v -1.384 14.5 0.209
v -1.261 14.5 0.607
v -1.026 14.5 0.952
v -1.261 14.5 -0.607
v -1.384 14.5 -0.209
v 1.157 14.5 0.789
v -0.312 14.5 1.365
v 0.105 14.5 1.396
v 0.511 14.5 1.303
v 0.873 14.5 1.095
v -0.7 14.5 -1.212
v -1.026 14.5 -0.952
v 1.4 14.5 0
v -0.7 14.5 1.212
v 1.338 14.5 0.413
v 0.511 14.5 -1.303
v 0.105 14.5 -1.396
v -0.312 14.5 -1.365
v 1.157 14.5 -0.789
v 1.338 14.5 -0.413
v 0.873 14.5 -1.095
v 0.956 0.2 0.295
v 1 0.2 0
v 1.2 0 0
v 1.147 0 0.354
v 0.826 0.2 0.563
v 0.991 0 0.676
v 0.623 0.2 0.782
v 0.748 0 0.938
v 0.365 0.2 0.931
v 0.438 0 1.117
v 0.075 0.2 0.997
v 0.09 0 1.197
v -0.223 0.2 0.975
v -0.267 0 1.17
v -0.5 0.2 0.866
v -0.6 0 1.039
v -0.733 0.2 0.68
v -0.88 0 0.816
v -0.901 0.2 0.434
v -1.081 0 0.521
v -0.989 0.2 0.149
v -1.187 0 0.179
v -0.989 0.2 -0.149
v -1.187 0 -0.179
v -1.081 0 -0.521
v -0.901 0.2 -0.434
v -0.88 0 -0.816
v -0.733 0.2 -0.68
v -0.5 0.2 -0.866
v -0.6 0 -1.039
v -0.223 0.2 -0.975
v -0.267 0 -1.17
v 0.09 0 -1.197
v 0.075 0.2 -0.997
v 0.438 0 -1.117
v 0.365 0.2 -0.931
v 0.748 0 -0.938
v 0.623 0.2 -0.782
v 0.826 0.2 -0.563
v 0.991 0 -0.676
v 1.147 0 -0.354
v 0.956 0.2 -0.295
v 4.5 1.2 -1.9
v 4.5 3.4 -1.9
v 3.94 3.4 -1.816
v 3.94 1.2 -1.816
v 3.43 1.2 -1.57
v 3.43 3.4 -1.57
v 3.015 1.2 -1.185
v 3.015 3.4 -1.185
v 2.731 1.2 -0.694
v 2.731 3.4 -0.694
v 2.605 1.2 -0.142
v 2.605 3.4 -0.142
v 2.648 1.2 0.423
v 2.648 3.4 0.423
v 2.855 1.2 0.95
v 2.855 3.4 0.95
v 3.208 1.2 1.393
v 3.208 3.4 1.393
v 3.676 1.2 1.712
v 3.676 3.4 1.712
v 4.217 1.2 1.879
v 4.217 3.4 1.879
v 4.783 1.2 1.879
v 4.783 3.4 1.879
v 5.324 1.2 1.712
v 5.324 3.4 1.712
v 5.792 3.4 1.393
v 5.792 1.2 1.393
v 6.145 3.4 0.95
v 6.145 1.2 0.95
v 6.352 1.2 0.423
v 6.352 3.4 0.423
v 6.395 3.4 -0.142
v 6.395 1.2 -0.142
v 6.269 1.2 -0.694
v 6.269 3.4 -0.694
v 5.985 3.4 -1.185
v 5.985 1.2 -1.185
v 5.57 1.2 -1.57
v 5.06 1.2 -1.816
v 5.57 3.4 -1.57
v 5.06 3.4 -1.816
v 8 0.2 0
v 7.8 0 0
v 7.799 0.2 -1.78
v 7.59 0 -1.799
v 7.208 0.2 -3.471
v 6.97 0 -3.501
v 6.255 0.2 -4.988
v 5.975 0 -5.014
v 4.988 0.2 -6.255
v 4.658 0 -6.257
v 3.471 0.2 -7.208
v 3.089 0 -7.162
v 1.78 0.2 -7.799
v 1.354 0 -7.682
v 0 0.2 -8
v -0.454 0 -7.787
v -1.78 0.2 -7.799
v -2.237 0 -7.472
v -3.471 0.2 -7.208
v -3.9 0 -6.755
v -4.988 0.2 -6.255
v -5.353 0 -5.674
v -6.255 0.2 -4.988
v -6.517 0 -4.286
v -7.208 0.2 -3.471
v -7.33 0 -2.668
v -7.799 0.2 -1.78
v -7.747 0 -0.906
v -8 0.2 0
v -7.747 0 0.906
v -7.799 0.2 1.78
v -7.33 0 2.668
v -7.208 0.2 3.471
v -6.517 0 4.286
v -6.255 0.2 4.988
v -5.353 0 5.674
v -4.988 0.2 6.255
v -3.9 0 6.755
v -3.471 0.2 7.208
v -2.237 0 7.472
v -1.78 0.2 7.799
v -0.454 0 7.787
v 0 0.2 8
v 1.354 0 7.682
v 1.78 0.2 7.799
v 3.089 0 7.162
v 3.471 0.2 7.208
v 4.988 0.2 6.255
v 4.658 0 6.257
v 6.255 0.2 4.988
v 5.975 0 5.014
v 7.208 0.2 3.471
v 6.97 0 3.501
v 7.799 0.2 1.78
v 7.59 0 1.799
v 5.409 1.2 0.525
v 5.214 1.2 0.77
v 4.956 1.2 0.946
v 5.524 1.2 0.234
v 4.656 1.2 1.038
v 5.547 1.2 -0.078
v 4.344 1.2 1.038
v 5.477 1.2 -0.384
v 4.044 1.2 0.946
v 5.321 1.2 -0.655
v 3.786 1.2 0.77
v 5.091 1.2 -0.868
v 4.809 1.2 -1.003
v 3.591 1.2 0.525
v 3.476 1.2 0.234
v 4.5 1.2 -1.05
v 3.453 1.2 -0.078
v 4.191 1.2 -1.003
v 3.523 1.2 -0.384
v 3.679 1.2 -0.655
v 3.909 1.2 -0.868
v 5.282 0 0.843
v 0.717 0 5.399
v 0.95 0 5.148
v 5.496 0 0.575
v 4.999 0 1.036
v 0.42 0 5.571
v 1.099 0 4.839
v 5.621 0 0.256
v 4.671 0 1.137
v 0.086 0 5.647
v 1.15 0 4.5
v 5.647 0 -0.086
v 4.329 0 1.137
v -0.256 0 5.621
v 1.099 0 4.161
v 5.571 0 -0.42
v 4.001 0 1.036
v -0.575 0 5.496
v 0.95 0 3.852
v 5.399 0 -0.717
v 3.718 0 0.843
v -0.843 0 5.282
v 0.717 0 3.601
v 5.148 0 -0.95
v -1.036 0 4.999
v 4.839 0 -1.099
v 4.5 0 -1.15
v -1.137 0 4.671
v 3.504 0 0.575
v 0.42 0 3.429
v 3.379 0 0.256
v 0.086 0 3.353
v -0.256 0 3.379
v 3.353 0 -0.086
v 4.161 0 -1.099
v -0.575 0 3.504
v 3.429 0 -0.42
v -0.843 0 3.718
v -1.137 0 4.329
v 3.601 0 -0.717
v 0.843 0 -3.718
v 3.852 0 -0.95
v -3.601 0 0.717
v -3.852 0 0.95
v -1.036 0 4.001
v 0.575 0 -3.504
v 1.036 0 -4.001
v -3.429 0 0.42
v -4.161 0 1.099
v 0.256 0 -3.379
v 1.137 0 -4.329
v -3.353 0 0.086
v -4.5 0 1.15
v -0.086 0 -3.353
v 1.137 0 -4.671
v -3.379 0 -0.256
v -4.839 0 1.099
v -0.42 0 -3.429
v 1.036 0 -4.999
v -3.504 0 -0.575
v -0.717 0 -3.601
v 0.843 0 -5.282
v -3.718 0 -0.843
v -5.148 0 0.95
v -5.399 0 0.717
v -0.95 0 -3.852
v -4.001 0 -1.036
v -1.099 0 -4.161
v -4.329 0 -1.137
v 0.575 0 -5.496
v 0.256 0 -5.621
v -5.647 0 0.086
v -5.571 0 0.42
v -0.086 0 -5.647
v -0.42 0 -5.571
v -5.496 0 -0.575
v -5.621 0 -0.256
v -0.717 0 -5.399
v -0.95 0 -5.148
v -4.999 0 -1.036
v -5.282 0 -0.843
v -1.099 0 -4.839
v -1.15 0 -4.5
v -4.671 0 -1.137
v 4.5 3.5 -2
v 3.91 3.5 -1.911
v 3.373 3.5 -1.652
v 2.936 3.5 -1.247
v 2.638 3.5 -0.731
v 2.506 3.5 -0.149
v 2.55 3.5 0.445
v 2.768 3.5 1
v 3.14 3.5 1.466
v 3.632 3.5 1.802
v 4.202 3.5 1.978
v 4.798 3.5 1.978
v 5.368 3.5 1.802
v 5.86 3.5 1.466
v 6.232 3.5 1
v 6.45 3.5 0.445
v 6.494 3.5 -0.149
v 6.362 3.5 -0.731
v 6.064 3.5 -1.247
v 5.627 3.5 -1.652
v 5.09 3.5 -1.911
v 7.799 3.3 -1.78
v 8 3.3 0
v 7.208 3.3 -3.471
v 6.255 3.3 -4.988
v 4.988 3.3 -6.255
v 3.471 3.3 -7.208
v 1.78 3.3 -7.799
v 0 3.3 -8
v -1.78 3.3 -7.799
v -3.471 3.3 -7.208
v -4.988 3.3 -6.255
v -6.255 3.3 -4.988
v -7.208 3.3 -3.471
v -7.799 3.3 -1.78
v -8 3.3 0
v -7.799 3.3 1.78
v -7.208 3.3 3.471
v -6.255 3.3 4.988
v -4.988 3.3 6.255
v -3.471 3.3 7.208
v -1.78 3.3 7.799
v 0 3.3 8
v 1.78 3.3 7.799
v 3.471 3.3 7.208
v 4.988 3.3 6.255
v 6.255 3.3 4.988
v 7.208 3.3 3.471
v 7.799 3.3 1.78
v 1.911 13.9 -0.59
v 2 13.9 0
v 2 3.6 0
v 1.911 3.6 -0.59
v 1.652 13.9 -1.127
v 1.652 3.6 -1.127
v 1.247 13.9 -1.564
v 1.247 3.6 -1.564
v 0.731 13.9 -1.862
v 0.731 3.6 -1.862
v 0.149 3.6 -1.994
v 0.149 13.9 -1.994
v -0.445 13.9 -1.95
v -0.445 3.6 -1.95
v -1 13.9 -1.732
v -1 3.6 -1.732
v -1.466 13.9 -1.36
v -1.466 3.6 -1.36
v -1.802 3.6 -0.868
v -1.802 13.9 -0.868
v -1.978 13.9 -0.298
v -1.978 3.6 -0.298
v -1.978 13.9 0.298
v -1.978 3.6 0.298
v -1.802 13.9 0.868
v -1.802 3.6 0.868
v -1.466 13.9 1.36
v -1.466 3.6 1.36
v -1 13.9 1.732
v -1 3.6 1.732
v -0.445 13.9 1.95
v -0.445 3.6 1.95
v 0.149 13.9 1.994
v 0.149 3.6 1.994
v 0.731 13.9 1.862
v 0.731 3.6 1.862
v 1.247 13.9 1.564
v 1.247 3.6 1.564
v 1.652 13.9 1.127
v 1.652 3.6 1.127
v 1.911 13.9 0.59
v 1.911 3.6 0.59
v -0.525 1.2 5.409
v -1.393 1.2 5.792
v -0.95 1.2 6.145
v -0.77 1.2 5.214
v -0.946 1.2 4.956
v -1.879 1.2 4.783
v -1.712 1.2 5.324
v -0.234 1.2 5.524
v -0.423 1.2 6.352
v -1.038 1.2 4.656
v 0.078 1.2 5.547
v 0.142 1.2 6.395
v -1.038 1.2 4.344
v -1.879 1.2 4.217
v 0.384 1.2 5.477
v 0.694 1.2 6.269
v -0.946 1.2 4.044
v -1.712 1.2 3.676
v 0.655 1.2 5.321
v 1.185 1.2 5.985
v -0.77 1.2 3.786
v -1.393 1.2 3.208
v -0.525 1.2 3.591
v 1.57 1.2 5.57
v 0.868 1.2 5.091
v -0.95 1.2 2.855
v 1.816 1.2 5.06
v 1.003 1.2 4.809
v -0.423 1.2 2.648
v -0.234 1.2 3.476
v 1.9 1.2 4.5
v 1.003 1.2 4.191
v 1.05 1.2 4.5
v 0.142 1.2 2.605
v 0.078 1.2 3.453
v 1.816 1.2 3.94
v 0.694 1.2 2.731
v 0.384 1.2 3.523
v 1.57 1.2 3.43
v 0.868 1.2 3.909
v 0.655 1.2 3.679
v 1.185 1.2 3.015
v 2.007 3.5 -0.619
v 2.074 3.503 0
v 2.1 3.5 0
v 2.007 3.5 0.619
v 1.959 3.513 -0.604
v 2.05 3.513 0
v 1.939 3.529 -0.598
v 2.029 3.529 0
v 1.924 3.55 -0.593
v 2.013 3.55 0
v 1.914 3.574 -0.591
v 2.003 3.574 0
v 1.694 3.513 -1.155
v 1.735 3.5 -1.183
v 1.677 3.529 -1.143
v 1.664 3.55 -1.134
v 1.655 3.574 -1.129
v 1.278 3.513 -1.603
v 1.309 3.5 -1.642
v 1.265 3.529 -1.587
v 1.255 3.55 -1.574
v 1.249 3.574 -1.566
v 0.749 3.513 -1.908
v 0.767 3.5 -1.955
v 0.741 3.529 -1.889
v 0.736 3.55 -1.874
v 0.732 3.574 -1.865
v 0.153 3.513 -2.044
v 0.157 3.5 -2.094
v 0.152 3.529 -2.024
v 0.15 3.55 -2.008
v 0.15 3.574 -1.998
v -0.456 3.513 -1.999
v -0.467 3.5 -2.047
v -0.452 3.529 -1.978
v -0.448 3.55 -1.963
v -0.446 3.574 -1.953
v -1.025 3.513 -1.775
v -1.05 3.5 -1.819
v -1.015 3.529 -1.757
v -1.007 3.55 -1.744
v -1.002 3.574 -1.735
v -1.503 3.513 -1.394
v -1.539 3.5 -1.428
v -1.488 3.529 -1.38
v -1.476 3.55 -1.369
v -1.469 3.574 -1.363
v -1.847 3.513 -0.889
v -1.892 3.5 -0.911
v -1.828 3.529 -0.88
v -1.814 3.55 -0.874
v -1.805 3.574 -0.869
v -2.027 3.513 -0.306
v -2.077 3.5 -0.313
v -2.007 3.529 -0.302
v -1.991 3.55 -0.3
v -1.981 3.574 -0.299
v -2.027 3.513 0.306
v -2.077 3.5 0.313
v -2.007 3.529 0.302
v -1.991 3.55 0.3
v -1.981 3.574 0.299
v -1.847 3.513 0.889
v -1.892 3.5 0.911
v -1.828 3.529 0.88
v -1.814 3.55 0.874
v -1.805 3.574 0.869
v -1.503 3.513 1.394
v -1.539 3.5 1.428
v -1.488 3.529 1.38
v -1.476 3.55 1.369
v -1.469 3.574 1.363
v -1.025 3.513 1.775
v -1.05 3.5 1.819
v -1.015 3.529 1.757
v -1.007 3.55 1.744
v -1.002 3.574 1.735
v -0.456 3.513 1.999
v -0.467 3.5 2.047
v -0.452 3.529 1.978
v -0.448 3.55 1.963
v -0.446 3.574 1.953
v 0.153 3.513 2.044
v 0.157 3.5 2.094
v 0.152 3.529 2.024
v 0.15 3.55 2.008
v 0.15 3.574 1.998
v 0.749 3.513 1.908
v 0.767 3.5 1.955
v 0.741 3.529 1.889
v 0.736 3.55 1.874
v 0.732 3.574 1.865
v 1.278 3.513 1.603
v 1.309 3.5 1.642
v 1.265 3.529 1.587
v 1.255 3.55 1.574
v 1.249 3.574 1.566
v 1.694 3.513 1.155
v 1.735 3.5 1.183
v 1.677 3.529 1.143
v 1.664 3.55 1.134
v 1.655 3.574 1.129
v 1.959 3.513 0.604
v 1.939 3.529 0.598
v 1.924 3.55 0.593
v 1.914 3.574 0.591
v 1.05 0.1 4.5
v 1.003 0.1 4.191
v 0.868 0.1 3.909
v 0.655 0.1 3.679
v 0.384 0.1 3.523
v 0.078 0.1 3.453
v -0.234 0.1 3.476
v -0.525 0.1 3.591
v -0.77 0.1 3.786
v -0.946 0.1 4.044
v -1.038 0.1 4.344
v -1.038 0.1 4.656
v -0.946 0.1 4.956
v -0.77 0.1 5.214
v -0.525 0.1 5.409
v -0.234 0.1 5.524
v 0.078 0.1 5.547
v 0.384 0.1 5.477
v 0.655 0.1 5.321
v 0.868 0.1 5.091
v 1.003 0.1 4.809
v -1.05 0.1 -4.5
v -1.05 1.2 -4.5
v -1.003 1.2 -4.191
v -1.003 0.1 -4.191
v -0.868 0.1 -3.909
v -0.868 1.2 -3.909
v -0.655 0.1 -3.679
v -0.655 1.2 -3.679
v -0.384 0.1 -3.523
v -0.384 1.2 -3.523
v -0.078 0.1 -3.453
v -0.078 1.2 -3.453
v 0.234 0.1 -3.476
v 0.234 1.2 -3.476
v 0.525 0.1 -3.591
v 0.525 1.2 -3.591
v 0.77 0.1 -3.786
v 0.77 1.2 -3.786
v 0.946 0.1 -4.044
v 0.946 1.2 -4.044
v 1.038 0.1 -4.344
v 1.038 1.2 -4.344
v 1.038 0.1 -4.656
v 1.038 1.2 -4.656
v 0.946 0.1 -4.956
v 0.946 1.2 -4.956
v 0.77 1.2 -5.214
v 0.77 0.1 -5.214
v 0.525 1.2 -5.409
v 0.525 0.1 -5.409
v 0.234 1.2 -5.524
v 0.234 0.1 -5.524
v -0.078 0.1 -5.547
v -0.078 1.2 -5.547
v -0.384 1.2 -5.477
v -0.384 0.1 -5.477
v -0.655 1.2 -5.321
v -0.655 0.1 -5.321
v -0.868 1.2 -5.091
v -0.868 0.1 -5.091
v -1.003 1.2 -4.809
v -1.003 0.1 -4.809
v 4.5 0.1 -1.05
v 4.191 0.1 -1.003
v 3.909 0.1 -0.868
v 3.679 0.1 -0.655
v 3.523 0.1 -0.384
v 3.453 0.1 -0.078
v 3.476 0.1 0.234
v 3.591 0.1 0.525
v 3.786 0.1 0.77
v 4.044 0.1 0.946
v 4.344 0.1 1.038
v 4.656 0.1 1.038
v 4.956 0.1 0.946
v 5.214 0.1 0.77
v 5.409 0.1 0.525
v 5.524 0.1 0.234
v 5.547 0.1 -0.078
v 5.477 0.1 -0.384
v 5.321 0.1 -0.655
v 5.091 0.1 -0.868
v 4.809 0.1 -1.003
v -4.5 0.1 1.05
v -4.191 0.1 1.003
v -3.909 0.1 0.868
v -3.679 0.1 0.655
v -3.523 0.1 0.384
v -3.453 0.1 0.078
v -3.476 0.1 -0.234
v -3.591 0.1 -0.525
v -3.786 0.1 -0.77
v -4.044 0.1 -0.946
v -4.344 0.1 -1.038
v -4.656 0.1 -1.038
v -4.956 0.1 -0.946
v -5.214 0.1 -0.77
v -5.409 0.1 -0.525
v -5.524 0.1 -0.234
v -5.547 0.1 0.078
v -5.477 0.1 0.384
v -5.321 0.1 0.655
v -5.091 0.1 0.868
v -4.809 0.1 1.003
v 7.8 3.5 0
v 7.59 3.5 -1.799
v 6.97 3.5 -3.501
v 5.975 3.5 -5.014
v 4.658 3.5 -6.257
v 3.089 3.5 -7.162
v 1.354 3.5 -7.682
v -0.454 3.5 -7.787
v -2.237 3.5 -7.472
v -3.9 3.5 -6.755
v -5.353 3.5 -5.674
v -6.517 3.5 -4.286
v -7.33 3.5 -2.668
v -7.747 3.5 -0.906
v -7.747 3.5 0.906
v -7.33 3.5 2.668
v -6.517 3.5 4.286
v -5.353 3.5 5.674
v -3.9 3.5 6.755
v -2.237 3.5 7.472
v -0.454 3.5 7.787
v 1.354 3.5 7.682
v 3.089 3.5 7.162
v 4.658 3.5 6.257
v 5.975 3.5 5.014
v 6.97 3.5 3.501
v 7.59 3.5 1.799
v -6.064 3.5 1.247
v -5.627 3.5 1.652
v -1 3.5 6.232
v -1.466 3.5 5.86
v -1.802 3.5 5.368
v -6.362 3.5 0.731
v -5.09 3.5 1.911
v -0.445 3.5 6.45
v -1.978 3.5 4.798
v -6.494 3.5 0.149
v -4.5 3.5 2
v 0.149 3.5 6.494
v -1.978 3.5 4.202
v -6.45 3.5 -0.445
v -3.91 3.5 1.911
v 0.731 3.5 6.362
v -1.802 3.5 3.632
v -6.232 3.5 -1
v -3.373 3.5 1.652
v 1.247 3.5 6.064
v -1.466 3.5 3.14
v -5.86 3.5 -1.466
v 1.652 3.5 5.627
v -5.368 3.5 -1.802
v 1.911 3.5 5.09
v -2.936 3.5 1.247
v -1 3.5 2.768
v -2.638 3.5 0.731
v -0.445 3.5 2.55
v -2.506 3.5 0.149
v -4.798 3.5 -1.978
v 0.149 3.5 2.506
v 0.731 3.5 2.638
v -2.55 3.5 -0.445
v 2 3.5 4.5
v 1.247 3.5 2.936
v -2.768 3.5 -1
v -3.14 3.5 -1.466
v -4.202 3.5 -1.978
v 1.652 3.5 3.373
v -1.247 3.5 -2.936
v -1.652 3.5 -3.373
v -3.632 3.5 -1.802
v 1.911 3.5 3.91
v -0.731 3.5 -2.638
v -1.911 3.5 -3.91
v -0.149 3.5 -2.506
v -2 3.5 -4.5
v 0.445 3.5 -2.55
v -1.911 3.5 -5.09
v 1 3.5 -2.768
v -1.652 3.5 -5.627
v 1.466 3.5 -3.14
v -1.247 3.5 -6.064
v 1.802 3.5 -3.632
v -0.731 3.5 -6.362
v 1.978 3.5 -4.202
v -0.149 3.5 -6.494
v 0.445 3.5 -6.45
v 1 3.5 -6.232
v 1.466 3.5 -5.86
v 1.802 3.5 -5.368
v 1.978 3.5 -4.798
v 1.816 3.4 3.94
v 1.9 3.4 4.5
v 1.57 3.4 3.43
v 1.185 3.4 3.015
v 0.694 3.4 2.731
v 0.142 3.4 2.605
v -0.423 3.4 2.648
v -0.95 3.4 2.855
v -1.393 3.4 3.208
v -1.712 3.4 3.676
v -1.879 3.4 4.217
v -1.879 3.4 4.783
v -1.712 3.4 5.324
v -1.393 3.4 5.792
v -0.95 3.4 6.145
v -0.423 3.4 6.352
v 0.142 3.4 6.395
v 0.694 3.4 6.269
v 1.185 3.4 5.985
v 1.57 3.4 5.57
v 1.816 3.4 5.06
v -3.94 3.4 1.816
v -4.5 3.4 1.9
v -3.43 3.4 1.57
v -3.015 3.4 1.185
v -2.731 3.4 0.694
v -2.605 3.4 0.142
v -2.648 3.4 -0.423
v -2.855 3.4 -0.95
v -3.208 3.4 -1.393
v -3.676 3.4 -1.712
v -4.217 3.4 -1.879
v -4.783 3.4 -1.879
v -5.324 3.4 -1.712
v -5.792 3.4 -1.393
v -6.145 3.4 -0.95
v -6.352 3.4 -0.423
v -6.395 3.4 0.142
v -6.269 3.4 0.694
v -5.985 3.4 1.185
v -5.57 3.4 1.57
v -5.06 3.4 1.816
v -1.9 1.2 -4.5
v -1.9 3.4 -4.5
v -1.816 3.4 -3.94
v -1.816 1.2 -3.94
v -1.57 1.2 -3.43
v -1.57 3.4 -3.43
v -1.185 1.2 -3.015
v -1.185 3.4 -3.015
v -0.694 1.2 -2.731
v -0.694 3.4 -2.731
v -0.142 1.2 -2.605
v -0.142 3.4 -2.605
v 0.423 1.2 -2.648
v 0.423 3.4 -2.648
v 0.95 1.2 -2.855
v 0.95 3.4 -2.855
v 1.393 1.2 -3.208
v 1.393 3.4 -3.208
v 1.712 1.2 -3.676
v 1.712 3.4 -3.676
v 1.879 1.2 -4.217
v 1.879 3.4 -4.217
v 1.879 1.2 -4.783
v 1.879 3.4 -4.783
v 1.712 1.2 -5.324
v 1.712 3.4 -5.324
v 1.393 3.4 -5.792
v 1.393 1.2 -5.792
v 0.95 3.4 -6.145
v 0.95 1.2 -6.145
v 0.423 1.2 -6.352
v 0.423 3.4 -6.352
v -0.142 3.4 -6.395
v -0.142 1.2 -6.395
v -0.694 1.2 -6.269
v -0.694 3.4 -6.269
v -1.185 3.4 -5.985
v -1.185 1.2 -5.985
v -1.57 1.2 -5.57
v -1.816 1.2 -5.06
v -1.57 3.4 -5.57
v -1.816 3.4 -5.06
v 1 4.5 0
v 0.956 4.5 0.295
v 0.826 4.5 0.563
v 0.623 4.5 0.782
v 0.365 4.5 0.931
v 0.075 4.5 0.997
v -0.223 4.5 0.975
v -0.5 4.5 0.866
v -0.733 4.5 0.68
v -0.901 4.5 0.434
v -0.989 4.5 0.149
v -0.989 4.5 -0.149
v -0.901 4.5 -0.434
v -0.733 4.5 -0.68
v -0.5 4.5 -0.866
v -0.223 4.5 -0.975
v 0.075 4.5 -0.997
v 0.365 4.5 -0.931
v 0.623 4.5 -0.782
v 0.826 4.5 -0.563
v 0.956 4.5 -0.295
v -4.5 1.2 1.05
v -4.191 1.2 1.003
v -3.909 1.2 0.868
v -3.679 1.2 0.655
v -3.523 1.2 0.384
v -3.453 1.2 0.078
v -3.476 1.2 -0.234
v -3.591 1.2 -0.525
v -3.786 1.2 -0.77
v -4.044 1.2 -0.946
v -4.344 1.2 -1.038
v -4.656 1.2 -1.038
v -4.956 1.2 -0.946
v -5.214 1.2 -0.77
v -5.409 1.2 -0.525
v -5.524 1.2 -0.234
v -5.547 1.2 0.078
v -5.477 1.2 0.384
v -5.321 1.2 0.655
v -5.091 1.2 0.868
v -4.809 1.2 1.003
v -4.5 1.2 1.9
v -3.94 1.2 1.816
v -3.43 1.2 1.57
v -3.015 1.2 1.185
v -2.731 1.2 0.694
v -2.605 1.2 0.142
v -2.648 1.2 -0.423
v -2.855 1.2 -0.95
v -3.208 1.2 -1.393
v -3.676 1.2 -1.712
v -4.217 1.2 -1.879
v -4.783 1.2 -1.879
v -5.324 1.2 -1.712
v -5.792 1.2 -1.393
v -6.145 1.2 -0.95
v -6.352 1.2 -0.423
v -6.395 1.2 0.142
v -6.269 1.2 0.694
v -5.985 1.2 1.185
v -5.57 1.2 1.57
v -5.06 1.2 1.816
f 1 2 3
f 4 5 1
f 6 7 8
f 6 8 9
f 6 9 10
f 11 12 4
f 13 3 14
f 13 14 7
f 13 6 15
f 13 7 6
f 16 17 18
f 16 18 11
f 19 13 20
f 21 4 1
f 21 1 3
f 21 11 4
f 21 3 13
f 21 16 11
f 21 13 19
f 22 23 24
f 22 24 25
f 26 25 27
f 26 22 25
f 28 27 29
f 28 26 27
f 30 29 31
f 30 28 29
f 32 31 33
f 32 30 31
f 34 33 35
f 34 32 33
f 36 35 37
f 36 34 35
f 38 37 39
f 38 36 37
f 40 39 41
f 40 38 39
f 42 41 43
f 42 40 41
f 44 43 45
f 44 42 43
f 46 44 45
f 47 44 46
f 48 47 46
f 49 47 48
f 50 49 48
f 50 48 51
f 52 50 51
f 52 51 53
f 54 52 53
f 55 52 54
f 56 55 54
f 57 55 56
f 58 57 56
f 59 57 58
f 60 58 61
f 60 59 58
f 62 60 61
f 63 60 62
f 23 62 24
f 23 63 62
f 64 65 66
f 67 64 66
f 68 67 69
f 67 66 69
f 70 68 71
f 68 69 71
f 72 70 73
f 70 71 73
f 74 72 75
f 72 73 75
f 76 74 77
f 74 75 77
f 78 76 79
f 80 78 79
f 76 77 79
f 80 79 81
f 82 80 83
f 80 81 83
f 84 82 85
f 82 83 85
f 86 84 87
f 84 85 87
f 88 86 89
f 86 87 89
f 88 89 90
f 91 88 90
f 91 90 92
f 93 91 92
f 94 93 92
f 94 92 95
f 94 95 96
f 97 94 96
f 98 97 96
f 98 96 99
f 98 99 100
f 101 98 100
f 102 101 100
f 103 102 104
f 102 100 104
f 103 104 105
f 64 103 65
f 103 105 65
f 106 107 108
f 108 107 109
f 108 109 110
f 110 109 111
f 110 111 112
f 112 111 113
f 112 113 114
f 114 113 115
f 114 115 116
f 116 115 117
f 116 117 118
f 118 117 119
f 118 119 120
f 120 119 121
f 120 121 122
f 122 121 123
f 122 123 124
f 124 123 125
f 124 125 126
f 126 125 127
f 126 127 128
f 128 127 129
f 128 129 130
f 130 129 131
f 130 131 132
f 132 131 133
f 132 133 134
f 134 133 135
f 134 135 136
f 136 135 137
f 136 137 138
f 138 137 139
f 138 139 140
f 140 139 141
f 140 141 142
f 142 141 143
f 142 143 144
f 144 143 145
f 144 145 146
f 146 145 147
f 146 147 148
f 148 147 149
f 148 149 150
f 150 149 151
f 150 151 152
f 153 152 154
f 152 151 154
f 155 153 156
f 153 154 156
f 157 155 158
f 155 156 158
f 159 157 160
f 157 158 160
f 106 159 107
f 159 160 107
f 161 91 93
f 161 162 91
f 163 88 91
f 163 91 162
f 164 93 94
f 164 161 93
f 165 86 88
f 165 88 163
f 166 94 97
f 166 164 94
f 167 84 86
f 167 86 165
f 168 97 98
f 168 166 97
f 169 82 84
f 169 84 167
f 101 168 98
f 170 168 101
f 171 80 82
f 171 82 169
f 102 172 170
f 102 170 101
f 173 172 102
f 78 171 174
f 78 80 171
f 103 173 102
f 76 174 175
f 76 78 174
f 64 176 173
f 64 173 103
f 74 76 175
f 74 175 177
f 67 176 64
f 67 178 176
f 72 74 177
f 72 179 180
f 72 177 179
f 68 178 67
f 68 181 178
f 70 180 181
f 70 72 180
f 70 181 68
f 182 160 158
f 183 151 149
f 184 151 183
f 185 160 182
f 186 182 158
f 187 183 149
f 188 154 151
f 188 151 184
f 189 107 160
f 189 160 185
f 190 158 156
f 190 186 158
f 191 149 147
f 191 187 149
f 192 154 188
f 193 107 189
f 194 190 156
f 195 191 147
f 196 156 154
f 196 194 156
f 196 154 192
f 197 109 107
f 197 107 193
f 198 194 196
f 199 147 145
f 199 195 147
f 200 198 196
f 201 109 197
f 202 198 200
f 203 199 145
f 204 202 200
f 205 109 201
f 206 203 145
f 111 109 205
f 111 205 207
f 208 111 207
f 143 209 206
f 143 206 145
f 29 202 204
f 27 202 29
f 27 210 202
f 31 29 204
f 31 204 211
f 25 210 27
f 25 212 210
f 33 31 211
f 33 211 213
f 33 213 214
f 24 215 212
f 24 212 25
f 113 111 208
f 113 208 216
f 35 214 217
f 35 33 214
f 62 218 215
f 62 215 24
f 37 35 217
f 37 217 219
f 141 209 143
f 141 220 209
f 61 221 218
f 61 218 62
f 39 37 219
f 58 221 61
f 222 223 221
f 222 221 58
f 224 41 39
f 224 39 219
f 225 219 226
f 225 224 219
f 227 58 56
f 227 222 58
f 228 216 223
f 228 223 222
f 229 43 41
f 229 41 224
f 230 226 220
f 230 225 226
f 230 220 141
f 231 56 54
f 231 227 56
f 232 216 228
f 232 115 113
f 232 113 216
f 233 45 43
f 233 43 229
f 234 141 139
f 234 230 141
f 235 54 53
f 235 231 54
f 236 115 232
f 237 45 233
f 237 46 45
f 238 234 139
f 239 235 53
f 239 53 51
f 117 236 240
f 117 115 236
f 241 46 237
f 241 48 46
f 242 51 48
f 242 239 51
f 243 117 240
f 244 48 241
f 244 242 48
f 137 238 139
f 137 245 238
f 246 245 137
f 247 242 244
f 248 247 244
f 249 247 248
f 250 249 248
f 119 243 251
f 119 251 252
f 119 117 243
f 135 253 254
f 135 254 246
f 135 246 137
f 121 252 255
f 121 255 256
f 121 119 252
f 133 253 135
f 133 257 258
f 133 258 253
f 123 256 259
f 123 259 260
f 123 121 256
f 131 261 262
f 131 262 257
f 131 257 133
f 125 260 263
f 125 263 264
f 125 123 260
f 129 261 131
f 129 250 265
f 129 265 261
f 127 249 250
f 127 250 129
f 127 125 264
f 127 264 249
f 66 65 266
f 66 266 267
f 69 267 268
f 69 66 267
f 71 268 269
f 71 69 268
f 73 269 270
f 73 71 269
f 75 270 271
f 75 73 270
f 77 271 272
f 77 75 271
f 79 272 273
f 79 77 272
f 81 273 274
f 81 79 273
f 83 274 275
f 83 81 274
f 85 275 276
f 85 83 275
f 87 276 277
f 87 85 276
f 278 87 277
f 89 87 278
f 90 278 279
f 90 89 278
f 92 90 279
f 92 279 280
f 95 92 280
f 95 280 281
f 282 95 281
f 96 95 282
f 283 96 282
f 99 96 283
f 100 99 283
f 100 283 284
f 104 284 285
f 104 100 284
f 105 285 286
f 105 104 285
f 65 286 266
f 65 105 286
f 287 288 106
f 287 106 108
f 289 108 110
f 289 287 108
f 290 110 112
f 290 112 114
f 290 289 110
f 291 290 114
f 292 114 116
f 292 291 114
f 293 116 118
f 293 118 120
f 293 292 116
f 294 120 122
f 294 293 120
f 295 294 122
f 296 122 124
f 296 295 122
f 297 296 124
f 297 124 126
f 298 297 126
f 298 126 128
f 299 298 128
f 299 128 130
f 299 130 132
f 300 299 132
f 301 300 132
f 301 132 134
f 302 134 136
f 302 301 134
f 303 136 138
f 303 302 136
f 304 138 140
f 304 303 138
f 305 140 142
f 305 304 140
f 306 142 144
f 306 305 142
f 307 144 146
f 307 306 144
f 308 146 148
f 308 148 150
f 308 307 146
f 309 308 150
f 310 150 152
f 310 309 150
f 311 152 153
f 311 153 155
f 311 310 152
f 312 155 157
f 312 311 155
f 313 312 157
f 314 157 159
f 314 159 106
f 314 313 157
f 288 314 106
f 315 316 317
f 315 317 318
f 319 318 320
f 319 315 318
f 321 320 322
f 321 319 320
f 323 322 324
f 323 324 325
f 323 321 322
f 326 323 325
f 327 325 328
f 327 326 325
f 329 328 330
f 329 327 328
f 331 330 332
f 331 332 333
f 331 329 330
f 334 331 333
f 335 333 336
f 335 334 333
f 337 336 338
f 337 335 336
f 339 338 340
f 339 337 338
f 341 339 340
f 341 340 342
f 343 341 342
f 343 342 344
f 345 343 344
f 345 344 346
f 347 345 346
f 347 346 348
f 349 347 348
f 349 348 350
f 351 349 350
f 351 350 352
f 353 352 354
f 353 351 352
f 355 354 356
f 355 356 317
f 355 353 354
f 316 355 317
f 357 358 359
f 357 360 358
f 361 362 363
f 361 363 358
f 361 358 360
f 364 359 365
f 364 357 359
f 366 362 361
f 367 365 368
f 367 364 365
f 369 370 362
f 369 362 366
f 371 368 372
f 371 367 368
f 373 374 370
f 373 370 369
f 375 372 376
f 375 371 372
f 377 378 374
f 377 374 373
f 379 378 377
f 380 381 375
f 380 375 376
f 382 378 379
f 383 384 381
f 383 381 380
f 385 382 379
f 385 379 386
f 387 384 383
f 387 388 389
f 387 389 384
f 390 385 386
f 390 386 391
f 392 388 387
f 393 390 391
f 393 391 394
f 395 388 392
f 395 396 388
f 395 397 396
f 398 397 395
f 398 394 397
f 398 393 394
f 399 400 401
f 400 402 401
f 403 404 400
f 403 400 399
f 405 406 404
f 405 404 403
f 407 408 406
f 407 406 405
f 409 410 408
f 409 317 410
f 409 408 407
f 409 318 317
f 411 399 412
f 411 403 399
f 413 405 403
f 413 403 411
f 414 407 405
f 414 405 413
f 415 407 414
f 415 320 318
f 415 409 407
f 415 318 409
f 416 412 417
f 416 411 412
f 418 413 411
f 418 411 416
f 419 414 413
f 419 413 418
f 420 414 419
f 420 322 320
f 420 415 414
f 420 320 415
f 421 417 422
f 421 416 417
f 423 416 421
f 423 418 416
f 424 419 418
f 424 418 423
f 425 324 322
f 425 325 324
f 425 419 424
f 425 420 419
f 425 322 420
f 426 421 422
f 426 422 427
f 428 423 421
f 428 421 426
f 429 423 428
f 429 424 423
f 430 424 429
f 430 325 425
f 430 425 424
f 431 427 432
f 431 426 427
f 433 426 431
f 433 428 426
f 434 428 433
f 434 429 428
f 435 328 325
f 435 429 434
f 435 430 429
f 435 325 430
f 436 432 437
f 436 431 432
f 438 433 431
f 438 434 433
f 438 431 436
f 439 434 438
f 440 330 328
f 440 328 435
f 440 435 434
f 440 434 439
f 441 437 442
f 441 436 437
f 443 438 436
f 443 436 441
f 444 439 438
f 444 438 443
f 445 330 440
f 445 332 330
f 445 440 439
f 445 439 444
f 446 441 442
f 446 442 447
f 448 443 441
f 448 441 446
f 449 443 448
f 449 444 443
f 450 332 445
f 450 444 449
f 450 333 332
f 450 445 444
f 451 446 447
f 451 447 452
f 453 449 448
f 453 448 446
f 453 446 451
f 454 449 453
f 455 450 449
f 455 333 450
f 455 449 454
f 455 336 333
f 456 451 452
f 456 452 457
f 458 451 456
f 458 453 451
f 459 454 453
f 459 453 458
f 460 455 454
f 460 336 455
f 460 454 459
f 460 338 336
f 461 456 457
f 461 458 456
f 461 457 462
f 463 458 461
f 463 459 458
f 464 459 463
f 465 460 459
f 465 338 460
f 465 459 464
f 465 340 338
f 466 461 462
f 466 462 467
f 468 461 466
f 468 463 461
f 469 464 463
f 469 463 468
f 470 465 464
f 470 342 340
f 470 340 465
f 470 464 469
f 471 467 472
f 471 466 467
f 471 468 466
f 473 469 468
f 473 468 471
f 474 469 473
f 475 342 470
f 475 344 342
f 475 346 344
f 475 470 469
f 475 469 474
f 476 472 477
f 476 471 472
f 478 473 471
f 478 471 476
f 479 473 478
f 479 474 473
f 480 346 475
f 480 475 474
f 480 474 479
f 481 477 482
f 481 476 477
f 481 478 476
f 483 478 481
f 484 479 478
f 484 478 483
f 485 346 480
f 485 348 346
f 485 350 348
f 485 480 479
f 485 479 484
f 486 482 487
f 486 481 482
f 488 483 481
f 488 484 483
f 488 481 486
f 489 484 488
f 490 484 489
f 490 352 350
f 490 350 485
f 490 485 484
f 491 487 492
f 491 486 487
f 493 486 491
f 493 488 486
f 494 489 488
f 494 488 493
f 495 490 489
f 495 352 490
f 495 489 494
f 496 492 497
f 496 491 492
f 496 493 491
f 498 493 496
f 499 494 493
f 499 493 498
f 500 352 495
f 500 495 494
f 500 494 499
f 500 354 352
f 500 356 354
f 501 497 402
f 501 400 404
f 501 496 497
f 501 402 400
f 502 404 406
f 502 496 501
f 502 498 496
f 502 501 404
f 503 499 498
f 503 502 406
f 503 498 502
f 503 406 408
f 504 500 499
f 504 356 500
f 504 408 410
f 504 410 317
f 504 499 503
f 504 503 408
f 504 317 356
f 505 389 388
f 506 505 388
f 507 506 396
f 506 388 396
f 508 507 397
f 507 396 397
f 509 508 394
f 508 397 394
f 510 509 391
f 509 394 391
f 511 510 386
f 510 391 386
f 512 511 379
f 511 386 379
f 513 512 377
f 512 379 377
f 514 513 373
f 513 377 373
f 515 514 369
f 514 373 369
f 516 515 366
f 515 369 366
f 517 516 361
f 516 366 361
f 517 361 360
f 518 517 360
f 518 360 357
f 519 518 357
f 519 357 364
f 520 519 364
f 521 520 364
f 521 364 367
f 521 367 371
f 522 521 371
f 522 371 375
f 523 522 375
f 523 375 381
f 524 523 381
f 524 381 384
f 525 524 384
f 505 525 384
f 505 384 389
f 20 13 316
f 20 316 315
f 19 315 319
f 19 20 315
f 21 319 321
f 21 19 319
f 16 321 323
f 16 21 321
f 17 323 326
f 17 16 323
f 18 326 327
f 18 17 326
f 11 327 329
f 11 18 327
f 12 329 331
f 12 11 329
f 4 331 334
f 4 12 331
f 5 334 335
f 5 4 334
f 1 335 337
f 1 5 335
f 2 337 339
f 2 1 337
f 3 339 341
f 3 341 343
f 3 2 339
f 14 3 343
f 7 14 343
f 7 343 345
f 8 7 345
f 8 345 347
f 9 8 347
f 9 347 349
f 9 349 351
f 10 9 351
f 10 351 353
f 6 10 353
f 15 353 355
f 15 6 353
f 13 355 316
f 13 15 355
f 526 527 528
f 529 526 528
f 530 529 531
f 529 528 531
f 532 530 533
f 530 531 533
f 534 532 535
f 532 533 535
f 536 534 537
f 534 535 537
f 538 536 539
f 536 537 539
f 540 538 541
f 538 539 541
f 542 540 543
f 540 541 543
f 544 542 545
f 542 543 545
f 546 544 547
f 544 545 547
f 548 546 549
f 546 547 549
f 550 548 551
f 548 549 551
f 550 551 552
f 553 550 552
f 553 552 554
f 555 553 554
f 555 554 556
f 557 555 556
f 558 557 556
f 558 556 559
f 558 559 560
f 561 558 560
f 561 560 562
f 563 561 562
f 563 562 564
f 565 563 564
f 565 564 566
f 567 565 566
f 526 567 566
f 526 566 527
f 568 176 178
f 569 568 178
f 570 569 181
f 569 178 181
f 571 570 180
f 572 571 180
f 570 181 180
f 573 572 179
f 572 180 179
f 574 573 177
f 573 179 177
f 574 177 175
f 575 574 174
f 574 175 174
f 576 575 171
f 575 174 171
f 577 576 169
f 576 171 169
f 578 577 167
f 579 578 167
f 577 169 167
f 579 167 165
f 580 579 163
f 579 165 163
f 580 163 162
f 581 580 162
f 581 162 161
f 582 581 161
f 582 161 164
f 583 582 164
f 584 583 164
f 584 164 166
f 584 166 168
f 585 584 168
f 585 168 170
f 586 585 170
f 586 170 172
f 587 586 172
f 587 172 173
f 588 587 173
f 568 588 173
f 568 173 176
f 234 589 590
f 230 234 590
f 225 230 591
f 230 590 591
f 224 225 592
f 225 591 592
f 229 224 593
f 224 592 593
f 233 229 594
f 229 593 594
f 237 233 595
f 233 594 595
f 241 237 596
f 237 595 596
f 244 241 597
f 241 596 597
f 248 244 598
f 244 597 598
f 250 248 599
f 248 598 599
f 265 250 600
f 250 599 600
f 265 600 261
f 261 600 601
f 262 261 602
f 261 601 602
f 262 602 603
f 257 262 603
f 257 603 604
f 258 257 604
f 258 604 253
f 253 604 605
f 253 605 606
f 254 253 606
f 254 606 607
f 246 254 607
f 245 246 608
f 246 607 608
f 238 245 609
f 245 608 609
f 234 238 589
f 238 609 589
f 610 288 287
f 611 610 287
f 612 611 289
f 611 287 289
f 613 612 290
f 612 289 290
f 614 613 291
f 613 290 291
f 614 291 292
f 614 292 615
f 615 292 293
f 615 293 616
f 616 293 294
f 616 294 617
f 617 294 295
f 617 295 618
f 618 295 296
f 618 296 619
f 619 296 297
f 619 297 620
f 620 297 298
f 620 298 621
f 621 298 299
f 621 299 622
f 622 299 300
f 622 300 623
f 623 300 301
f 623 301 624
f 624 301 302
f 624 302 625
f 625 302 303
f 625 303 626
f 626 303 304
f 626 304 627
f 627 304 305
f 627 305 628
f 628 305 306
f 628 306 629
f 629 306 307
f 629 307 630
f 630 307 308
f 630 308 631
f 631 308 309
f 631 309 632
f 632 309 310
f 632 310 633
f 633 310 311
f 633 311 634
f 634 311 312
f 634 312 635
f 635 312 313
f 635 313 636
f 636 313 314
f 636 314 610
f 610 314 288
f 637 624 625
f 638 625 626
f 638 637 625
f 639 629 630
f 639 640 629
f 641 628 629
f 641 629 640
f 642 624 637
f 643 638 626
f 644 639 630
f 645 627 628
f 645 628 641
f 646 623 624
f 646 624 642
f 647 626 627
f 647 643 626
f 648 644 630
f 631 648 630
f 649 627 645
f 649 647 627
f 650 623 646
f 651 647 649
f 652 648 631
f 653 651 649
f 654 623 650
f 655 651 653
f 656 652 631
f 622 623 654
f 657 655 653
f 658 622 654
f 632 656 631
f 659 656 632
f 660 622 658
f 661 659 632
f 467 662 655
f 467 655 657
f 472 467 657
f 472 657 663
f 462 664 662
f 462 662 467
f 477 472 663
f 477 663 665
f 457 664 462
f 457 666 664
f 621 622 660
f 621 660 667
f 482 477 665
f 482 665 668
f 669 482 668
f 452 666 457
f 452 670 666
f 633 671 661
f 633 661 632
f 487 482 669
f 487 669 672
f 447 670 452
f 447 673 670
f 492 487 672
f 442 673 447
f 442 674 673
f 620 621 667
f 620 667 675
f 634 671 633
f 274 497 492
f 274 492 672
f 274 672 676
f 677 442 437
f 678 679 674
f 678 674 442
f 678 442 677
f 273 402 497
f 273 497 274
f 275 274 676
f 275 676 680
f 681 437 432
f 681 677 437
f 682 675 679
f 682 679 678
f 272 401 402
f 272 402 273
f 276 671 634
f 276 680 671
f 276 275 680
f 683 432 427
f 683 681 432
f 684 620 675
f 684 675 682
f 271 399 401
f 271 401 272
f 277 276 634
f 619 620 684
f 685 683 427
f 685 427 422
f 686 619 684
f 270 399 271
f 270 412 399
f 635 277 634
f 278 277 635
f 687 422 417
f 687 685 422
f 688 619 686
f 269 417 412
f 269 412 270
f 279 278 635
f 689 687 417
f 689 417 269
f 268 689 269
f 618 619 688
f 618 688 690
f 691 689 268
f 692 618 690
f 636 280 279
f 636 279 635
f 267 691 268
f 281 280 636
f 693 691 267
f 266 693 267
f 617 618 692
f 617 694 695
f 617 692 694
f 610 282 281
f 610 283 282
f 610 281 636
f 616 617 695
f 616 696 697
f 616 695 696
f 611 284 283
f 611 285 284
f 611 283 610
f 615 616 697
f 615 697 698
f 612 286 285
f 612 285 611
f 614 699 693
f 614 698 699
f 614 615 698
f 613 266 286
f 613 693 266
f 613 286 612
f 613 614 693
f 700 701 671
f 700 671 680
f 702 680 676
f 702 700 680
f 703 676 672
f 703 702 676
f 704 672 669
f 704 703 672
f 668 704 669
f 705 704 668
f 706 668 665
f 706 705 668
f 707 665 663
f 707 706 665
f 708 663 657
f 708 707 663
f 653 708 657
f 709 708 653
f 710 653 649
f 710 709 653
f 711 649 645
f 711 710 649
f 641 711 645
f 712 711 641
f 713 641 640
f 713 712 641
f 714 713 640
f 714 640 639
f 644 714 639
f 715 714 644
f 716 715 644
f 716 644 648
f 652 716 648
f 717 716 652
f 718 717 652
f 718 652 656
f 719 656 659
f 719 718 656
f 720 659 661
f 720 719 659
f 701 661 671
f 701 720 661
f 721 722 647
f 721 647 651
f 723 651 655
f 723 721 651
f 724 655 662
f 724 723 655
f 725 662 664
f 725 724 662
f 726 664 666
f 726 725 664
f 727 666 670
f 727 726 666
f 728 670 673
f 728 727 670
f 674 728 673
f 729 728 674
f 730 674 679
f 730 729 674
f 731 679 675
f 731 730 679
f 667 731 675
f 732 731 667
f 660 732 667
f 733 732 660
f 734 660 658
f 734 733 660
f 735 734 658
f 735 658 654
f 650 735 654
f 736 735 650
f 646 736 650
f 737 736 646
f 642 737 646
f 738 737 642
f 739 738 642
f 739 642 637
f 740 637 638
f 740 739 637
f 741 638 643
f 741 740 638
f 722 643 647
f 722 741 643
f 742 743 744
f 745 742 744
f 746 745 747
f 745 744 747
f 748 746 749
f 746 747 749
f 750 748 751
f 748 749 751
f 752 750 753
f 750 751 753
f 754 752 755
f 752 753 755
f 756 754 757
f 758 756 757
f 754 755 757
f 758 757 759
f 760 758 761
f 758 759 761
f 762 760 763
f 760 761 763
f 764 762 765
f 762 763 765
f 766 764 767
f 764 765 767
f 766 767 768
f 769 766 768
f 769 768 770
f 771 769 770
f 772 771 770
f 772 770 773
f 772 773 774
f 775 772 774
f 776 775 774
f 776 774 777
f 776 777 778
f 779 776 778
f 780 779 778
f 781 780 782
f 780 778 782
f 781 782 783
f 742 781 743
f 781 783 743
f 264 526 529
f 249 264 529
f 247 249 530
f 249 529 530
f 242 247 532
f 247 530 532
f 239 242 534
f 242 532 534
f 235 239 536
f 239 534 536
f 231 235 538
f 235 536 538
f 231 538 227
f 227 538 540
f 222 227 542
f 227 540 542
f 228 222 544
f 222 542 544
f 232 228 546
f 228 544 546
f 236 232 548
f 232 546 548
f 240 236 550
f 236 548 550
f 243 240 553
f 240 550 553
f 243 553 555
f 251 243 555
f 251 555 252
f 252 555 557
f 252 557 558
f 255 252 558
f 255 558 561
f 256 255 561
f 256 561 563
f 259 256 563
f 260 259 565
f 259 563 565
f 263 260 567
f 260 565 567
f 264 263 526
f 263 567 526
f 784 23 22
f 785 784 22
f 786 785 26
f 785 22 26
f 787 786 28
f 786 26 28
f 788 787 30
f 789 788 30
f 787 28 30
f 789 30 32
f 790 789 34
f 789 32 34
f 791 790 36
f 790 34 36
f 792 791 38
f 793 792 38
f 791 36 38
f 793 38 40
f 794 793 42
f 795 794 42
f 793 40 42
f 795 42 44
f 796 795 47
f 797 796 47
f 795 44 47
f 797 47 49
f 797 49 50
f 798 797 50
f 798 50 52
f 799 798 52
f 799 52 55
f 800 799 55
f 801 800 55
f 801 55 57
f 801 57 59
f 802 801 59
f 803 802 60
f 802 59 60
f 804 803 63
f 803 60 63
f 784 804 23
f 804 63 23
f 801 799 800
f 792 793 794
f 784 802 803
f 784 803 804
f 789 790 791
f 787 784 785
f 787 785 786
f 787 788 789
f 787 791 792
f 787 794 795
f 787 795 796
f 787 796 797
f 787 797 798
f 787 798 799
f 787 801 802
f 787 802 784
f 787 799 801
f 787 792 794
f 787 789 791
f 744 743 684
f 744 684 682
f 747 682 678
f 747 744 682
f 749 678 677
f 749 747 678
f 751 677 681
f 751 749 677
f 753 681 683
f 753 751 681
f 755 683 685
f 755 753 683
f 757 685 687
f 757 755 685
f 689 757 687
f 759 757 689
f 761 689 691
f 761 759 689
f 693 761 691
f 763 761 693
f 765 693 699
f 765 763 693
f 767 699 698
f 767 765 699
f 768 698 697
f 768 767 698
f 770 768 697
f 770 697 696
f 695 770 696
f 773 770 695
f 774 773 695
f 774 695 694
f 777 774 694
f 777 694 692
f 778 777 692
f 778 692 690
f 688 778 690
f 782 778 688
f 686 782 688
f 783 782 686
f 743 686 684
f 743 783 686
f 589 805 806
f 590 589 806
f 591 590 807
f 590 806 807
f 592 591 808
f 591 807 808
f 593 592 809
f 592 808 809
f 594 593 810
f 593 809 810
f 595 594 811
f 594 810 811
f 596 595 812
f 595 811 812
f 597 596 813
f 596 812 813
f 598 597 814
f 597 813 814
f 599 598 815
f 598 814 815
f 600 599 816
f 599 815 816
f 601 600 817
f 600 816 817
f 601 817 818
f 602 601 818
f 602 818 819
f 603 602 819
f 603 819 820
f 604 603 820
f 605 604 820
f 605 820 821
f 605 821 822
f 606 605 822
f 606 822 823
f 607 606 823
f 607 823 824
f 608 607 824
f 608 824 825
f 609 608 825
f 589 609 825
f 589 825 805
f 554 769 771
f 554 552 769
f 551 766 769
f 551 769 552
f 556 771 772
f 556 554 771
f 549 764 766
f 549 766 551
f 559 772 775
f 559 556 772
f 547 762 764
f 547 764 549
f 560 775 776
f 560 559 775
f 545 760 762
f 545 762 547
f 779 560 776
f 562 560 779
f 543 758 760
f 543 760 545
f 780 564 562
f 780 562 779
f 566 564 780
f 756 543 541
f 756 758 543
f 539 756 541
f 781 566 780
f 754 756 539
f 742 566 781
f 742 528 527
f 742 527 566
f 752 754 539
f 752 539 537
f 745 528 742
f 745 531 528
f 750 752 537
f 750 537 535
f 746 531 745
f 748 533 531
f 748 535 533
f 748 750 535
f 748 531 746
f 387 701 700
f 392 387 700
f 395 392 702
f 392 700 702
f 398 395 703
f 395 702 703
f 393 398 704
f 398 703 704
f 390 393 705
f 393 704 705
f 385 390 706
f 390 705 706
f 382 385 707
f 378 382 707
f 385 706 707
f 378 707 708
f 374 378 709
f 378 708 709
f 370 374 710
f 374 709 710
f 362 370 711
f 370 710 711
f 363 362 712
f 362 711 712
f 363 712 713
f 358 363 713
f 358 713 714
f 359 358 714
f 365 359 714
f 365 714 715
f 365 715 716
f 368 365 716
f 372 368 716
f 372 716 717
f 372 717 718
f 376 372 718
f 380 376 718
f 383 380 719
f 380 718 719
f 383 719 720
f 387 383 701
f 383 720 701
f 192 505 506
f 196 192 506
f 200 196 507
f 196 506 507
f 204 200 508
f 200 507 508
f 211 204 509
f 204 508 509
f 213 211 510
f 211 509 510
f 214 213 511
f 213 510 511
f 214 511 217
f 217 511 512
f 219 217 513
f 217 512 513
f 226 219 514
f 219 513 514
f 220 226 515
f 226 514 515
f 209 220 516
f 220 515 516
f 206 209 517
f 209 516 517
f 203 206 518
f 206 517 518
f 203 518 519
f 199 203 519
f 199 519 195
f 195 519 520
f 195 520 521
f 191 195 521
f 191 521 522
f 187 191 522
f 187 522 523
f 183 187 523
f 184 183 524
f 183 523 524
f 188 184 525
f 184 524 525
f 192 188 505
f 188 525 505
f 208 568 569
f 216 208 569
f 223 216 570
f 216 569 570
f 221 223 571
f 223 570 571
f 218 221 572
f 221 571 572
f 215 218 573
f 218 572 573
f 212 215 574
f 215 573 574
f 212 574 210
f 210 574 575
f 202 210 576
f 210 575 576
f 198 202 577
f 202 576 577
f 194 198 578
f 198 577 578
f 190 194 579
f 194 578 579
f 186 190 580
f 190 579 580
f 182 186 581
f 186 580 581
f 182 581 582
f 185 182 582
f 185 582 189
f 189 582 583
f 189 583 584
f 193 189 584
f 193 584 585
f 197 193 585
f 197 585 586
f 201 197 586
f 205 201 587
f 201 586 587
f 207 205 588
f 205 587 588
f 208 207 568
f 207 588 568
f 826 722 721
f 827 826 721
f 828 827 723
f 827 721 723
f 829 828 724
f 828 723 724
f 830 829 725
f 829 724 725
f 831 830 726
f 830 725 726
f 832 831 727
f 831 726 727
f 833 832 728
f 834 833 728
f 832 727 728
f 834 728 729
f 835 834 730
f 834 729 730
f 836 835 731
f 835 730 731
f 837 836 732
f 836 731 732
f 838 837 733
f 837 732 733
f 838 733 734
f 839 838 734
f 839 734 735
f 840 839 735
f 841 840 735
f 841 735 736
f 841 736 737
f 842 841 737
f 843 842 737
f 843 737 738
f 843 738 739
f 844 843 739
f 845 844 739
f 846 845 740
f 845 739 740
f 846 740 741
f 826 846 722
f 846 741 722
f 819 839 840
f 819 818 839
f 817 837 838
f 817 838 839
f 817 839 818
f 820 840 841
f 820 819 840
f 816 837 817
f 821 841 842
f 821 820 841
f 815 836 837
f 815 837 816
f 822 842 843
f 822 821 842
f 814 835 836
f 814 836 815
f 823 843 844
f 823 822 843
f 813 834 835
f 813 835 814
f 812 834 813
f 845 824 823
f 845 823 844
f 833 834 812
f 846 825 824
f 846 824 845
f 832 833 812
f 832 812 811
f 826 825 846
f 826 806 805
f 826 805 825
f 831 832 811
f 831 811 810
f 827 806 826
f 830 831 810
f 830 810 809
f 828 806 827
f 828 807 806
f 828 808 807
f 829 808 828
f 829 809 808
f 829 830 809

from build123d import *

# Parameters (mm, degrees)
SKIZZE3_R                       = 1.05
SCHNITT_LINEAR_AUSTRAGEN1_DEPTH = 16.779733838
SKIZZE4_R                       = 1.9
SCHNITT_LINEAR_AUSTRAGEN2_DEPTH = 2.3
FASE1_SIZE                      = 0.1
KREISMUSTER1_COUNT              = 4
FASE1_OF_KREISMUSTER1_SIZE      = 0.1
VERRUNDUNG1_R                   = 0.1
FASE2_SIZE                      = 0.6
SKIZZE5_R                       = 1
SCHNITT_LINEAR_AUSTRAGEN3_DEPTH = 4.5
FASE3_SIZE                      = 0.2


with BuildPart() as part:
    # Skizze2 → Rotation1 (revolve)
    with BuildSketch(Plane.XY):
        Polygon((0, 0), (8, 0), (8, 3.5), (2, 3.5), (2, 14.5), (0, 14.5), align=None)
    revolve(axis=Axis((0, 0, 0), (0, 1, 0)))

    # Skizze3 → Schnitt-Linear austragen1 (cut, through all)
    with BuildSketch(Plane(origin=(0, 3.5, 0), x_dir=(1, 0, 0), z_dir=(0, 1, 0))):
        with Locations(Location((0, 4.5, 0), (0, 0, 180))):
            Circle(SKIZZE3_R)
    schnitt_linear_austragen1 = extrude(amount=-SCHNITT_LINEAR_AUSTRAGEN1_DEPTH, mode=Mode.SUBTRACT)

    # Skizze4 → Schnitt-Linear austragen2 (cut)
    with BuildSketch(Plane(origin=(0, 3.5, 0), x_dir=(1, 0, 0), z_dir=(0, 1, 0))):
        with Locations(Location((0, 4.5, 0), (0, 0, 180))):
            Circle(SKIZZE4_R)
    schnitt_linear_austragen2 = extrude(amount=-SCHNITT_LINEAR_AUSTRAGEN2_DEPTH, mode=Mode.SUBTRACT)

    # Fase1
    fase1_edges = [part.edges().sort_by_distance(p)[0] for p in [
        (1.05, 0, -4.5),
        (1.9, 3.5, -4.5),
    ]]
    chamfer(fase1_edges, length=FASE1_SIZE)

    # Kreismuster1: Schnitt-Linear austragen1, Schnitt-Linear austragen2 ×4 about axis
    kreismuster1_axis = Axis((0, 0, 0), (0, 1, 0))
    add([schnitt_linear_austragen1.rotate(kreismuster1_axis, i * 360 / KREISMUSTER1_COUNT) for i in range(1, KREISMUSTER1_COUNT)], mode=Mode.SUBTRACT)
    add([schnitt_linear_austragen2.rotate(kreismuster1_axis, i * 360 / KREISMUSTER1_COUNT) for i in range(1, KREISMUSTER1_COUNT)], mode=Mode.SUBTRACT)

    # Fase1 of Kreismuster1
    fase1_of_kreismuster1_edges = [part.edges().sort_by_distance(p)[0] for p in [
        (-4.5, 0, -1.05),
        (-4.5, 3.5, -1.9),
        (-1.05, 0, 4.5),
        (-1.9, 3.5, 4.5),
        (4.5, 0, 1.05),
        (4.5, 3.5, 1.9),
    ]]
    chamfer(fase1_of_kreismuster1_edges, length=FASE1_OF_KREISMUSTER1_SIZE)

    # Verrundung1
    verrundung1_edges = [part.edges().sort_by_distance(p)[0] for p in [
        (-2, 3.5, 0),
    ]]
    fillet(verrundung1_edges, radius=VERRUNDUNG1_R)

    # Fase2
    fase2_edges = [part.edges().sort_by_distance(p)[0] for p in [
        (-2, 14.5, 0),
    ]]
    chamfer(fase2_edges, length=FASE2_SIZE)

    # Skizze5 → Schnitt-Linear austragen3 (cut)
    with BuildSketch(Plane.XZ):
        Circle(SKIZZE5_R)
    extrude(amount=-SCHNITT_LINEAR_AUSTRAGEN3_DEPTH, mode=Mode.SUBTRACT)

    # Fase3
    fase3_edges = [part.edges().sort_by_distance(p)[0] for p in [
        (-8, 3.5, 0),
        (-8, 0, 0),
        (-1, 0, 0),
    ]]
    chamfer(fase3_edges, length=FASE3_SIZE)


solid = part.part
